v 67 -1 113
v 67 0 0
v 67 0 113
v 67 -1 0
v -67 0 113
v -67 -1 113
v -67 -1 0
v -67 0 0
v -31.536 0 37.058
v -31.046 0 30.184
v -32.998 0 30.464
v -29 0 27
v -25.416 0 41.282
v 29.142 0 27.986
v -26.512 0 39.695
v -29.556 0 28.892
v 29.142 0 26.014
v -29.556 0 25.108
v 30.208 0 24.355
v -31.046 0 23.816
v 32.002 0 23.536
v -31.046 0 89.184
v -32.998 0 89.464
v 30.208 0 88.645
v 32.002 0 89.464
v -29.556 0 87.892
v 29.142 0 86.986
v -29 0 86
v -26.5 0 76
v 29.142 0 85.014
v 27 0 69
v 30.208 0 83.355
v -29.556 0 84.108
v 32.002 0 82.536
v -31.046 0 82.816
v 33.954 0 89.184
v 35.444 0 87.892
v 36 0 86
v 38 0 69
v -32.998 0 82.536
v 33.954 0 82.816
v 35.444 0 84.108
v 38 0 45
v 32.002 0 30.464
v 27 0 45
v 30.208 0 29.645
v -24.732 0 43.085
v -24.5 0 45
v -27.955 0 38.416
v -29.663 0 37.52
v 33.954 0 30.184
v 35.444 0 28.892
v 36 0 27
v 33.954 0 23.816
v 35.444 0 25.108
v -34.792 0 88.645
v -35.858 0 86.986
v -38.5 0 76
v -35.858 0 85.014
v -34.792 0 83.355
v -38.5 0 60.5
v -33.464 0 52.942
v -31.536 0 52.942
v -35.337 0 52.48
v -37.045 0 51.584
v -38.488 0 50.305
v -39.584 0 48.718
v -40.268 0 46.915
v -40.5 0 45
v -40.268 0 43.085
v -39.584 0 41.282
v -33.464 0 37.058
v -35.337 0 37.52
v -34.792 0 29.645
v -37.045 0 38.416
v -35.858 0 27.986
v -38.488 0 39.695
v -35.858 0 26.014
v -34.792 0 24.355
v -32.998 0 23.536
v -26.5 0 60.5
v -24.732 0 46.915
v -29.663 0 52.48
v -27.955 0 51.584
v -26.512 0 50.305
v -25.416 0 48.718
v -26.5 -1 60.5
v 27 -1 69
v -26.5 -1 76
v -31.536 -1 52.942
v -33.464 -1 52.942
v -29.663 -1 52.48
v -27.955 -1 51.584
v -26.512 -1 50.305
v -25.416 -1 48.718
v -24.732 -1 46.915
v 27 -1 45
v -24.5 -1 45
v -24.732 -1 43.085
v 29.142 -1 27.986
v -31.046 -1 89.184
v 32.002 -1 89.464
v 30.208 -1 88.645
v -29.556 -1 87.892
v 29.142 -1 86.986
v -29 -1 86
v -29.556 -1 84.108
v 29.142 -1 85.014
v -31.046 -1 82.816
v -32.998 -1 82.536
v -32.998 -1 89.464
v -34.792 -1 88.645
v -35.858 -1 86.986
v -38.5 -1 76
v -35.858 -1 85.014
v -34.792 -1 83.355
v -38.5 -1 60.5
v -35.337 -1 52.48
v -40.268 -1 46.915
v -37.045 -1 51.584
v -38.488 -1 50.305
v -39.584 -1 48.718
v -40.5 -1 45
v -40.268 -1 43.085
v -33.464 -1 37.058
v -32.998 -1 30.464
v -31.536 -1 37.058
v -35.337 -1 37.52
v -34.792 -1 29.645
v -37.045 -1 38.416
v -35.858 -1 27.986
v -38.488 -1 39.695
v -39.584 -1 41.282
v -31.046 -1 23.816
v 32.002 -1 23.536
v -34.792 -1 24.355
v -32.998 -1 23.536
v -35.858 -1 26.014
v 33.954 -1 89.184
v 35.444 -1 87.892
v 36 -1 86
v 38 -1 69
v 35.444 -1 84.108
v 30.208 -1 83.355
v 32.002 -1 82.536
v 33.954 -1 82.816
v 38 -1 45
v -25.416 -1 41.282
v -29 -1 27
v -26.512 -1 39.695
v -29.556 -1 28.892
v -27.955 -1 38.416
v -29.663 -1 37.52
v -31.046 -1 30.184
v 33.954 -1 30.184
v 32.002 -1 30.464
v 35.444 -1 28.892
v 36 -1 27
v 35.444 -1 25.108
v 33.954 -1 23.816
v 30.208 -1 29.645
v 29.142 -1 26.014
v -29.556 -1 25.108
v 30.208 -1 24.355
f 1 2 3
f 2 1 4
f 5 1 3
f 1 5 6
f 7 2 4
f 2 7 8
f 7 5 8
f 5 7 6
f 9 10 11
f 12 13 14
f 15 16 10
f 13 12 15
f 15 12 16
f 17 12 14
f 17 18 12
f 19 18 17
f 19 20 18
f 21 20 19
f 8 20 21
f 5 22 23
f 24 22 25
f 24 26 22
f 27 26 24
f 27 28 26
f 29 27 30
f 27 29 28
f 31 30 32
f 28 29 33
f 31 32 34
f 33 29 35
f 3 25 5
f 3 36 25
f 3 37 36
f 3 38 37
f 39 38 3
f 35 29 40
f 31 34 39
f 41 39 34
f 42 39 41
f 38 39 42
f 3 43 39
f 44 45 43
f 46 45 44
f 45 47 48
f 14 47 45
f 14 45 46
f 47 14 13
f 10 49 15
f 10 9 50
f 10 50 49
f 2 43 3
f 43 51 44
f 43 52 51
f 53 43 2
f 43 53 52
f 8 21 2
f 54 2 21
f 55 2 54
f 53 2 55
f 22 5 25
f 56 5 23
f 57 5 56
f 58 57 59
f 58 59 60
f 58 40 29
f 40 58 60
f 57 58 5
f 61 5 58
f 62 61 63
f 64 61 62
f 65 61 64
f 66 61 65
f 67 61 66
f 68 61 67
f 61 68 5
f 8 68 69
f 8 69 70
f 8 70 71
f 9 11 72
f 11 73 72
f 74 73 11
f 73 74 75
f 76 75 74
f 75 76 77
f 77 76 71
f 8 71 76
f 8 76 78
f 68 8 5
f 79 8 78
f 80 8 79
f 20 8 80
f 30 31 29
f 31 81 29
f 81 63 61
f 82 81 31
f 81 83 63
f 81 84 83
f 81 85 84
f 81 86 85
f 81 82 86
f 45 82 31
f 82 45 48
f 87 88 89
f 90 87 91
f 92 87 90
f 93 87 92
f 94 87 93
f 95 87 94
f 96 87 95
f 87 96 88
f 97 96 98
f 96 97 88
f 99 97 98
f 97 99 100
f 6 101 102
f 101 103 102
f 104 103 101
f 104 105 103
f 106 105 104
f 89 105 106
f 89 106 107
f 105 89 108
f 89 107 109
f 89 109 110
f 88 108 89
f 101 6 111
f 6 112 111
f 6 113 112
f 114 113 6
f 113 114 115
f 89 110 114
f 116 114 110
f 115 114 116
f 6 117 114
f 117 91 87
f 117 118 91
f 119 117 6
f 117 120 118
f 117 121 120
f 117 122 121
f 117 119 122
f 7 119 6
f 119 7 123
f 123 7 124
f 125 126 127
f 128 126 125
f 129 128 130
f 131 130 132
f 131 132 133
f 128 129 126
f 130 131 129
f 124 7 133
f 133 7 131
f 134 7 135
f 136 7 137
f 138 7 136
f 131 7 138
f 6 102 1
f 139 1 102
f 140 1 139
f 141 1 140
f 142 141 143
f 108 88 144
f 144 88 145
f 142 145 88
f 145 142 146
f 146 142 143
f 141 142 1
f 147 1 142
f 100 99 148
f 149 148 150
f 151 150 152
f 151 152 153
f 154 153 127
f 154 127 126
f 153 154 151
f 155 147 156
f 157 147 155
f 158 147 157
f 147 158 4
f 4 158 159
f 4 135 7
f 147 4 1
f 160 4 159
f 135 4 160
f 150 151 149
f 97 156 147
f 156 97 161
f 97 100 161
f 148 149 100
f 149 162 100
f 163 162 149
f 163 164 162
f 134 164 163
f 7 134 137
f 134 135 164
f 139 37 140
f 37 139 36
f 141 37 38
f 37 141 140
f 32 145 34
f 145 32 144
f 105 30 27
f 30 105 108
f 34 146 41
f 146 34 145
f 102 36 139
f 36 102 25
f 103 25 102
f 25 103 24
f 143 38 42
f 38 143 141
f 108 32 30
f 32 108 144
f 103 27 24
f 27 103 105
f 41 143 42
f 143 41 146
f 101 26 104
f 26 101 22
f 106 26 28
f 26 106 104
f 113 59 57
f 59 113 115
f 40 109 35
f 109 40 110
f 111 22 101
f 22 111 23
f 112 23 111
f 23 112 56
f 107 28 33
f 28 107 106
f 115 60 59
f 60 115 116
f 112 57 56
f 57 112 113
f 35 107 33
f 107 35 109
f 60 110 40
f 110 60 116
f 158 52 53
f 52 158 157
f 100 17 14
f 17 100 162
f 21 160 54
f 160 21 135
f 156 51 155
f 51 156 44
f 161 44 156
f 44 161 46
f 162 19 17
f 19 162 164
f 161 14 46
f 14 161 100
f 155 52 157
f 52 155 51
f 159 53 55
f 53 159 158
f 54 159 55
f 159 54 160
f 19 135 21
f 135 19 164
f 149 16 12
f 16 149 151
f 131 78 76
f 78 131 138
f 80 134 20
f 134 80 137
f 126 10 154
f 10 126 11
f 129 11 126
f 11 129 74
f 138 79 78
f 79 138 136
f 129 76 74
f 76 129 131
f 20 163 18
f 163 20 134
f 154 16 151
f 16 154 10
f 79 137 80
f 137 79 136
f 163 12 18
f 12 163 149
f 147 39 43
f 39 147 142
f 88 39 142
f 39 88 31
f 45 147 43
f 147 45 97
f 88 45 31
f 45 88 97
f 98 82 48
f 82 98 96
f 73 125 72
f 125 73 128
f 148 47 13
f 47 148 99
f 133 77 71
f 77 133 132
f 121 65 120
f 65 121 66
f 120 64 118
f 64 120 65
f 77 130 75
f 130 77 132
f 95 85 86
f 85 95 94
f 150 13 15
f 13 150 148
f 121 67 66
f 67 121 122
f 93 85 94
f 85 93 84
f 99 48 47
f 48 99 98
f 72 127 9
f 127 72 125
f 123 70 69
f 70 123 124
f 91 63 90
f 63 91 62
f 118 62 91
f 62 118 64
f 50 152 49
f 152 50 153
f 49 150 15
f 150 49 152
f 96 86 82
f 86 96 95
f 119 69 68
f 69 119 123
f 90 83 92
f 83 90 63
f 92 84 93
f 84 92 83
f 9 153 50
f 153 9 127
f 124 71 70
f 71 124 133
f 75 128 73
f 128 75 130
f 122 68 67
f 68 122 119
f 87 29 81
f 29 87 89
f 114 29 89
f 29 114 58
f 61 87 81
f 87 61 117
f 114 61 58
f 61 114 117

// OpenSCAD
plateWidth = 134;
plateHeight = 113;
width = 1;

sensorWidth = 12;
sensorHeight = 15.5;

difference() {
translate([plateWidth/-2,-1 * width,0]) cube([134, width, 113]);

// Screws
translate([plateWidth/2-34.5,1,plateHeight-27]) rotate([90,0,0]) cylinder(r=7/2, h=width+2);
translate([plateWidth/-2+34.5,1,plateHeight-27]) rotate([90,0,0]) cylinder(r=7/2, h=width+2);
translate([plateWidth/2-34.5,1,27]) rotate([90,0,0]) cylinder(r=7/2, h=width+2);
translate([plateWidth/-2+34.5,1,27]) rotate([90,0,0]) cylinder(r=7/2, h=width+2);

// Light switch
translate([plateWidth/2-29-11,-1 * width -1,45]) cube([11, width+2, 24]);

// Button
translate([plateWidth/-2+34.5,1,27+16/2+10]) rotate([90,0,0]) cylinder(r=16/2, h=width+2);

// Sensor
translate([plateWidth/-2+34.5-6,-1 * width - 1, plateHeight-27-sensorHeight-10]) cube([sensorWidth, width+2, sensorHeight]);
}
